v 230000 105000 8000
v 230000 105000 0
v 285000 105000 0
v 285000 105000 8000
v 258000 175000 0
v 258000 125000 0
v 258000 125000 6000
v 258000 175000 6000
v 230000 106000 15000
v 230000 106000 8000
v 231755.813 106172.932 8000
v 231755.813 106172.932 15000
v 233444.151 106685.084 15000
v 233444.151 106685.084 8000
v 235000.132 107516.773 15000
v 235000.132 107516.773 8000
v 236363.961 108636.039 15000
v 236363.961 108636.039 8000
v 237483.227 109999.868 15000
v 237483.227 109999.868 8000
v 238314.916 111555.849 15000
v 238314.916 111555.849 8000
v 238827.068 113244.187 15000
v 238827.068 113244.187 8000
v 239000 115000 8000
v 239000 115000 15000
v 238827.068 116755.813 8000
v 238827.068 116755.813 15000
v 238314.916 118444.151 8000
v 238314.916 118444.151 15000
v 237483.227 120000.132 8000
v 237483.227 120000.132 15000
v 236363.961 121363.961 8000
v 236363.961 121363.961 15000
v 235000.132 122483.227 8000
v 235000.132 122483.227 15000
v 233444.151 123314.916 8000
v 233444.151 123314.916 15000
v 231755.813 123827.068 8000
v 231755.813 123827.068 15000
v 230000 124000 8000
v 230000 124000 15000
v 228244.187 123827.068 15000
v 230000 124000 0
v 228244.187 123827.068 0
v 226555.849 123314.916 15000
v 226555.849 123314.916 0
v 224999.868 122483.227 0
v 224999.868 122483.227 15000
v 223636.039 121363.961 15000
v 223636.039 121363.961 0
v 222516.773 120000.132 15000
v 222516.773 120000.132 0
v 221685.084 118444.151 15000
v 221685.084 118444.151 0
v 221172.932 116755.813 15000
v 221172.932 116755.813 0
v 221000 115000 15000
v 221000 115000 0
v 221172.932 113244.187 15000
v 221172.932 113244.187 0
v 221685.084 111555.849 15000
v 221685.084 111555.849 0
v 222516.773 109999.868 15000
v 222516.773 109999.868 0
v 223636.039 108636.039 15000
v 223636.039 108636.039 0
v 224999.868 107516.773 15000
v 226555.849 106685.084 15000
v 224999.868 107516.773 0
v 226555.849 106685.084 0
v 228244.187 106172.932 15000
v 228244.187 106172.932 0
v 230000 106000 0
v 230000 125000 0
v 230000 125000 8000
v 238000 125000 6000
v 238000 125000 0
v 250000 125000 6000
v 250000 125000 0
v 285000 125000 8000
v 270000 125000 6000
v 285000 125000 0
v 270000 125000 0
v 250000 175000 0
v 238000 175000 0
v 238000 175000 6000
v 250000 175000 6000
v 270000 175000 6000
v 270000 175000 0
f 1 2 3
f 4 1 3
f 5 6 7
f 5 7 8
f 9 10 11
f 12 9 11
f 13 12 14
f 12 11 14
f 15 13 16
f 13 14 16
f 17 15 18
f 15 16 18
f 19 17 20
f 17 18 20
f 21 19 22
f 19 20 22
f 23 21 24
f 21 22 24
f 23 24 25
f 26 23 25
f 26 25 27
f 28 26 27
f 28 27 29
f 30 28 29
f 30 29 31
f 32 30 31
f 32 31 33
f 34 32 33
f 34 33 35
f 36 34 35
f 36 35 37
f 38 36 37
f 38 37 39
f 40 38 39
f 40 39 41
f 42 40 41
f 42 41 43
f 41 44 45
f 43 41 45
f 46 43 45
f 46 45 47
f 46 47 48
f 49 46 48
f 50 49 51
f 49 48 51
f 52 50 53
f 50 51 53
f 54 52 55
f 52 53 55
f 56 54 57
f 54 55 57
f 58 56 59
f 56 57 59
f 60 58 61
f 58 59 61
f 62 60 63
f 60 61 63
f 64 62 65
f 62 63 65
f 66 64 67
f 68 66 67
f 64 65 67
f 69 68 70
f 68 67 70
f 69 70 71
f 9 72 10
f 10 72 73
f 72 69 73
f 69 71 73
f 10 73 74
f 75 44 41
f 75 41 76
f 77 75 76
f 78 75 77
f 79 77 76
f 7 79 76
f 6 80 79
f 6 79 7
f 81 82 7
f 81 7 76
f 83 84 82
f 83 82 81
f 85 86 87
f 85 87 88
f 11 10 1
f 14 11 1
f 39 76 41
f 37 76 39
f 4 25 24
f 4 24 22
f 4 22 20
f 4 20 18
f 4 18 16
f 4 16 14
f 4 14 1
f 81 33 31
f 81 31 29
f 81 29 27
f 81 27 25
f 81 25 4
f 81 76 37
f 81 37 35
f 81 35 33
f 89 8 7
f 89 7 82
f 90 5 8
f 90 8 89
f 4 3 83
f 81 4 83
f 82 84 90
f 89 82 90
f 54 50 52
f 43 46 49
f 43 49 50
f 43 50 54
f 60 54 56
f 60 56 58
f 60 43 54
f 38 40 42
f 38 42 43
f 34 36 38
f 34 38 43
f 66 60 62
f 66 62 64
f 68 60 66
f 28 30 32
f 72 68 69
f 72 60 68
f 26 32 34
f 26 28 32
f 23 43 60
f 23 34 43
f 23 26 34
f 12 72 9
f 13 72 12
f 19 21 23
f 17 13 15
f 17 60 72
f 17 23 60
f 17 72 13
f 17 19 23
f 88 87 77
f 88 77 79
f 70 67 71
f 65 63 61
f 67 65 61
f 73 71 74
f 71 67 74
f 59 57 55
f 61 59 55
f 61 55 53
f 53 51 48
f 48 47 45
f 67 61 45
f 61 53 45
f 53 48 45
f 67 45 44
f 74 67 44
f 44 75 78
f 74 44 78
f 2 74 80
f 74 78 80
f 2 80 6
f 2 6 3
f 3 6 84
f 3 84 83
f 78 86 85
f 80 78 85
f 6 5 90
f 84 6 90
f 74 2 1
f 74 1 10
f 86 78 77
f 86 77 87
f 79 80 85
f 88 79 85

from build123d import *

# Parameters (mm, degrees)
SKETCH_1_W      = 55000
SKETCH_1_H      = 20000
EXTRUDE_1_DEPTH = 8000
SKETCH_2_R      = 9000
EXTRUDE_2_DEPTH = 15000
SKETCH_3_W      = 12000
SKETCH_3_H      = 52000
EXTRUDE_3_DEPTH = 6000
SKETCH_4_W      = 12000
SKETCH_4_H      = 52000
EXTRUDE_4_DEPTH = 6000


with BuildPart() as part:
    # 草图1 → 凸台-拉伸1 (new body)
    with BuildSketch(Plane.XY):
        with Locations((257500, 115000)):
            Rectangle(SKETCH_1_W, SKETCH_1_H)
    extrude(amount=EXTRUDE_1_DEPTH)

    # 草图2 → 凸台-拉伸2 (add)
    with BuildSketch(Plane.XY):
        with Locations(Location((230000, 115000, 0), (0, 0, 270))):
            Circle(SKETCH_2_R)
    extrude(amount=EXTRUDE_2_DEPTH)

    # 草图3 → 凸台-拉伸3 (add)
    with BuildSketch(Plane.XY):
        with Locations((244000, 149000)):
            Rectangle(SKETCH_3_W, SKETCH_3_H)
    extrude(amount=EXTRUDE_3_DEPTH)

    # 草图4 → 凸台-拉伸4 (add)
    with BuildSketch(Plane.XY):
        with Locations((264000, 149000)):
            Rectangle(SKETCH_4_W, SKETCH_4_H)
    extrude(amount=EXTRUDE_4_DEPTH)


solid = part.part
